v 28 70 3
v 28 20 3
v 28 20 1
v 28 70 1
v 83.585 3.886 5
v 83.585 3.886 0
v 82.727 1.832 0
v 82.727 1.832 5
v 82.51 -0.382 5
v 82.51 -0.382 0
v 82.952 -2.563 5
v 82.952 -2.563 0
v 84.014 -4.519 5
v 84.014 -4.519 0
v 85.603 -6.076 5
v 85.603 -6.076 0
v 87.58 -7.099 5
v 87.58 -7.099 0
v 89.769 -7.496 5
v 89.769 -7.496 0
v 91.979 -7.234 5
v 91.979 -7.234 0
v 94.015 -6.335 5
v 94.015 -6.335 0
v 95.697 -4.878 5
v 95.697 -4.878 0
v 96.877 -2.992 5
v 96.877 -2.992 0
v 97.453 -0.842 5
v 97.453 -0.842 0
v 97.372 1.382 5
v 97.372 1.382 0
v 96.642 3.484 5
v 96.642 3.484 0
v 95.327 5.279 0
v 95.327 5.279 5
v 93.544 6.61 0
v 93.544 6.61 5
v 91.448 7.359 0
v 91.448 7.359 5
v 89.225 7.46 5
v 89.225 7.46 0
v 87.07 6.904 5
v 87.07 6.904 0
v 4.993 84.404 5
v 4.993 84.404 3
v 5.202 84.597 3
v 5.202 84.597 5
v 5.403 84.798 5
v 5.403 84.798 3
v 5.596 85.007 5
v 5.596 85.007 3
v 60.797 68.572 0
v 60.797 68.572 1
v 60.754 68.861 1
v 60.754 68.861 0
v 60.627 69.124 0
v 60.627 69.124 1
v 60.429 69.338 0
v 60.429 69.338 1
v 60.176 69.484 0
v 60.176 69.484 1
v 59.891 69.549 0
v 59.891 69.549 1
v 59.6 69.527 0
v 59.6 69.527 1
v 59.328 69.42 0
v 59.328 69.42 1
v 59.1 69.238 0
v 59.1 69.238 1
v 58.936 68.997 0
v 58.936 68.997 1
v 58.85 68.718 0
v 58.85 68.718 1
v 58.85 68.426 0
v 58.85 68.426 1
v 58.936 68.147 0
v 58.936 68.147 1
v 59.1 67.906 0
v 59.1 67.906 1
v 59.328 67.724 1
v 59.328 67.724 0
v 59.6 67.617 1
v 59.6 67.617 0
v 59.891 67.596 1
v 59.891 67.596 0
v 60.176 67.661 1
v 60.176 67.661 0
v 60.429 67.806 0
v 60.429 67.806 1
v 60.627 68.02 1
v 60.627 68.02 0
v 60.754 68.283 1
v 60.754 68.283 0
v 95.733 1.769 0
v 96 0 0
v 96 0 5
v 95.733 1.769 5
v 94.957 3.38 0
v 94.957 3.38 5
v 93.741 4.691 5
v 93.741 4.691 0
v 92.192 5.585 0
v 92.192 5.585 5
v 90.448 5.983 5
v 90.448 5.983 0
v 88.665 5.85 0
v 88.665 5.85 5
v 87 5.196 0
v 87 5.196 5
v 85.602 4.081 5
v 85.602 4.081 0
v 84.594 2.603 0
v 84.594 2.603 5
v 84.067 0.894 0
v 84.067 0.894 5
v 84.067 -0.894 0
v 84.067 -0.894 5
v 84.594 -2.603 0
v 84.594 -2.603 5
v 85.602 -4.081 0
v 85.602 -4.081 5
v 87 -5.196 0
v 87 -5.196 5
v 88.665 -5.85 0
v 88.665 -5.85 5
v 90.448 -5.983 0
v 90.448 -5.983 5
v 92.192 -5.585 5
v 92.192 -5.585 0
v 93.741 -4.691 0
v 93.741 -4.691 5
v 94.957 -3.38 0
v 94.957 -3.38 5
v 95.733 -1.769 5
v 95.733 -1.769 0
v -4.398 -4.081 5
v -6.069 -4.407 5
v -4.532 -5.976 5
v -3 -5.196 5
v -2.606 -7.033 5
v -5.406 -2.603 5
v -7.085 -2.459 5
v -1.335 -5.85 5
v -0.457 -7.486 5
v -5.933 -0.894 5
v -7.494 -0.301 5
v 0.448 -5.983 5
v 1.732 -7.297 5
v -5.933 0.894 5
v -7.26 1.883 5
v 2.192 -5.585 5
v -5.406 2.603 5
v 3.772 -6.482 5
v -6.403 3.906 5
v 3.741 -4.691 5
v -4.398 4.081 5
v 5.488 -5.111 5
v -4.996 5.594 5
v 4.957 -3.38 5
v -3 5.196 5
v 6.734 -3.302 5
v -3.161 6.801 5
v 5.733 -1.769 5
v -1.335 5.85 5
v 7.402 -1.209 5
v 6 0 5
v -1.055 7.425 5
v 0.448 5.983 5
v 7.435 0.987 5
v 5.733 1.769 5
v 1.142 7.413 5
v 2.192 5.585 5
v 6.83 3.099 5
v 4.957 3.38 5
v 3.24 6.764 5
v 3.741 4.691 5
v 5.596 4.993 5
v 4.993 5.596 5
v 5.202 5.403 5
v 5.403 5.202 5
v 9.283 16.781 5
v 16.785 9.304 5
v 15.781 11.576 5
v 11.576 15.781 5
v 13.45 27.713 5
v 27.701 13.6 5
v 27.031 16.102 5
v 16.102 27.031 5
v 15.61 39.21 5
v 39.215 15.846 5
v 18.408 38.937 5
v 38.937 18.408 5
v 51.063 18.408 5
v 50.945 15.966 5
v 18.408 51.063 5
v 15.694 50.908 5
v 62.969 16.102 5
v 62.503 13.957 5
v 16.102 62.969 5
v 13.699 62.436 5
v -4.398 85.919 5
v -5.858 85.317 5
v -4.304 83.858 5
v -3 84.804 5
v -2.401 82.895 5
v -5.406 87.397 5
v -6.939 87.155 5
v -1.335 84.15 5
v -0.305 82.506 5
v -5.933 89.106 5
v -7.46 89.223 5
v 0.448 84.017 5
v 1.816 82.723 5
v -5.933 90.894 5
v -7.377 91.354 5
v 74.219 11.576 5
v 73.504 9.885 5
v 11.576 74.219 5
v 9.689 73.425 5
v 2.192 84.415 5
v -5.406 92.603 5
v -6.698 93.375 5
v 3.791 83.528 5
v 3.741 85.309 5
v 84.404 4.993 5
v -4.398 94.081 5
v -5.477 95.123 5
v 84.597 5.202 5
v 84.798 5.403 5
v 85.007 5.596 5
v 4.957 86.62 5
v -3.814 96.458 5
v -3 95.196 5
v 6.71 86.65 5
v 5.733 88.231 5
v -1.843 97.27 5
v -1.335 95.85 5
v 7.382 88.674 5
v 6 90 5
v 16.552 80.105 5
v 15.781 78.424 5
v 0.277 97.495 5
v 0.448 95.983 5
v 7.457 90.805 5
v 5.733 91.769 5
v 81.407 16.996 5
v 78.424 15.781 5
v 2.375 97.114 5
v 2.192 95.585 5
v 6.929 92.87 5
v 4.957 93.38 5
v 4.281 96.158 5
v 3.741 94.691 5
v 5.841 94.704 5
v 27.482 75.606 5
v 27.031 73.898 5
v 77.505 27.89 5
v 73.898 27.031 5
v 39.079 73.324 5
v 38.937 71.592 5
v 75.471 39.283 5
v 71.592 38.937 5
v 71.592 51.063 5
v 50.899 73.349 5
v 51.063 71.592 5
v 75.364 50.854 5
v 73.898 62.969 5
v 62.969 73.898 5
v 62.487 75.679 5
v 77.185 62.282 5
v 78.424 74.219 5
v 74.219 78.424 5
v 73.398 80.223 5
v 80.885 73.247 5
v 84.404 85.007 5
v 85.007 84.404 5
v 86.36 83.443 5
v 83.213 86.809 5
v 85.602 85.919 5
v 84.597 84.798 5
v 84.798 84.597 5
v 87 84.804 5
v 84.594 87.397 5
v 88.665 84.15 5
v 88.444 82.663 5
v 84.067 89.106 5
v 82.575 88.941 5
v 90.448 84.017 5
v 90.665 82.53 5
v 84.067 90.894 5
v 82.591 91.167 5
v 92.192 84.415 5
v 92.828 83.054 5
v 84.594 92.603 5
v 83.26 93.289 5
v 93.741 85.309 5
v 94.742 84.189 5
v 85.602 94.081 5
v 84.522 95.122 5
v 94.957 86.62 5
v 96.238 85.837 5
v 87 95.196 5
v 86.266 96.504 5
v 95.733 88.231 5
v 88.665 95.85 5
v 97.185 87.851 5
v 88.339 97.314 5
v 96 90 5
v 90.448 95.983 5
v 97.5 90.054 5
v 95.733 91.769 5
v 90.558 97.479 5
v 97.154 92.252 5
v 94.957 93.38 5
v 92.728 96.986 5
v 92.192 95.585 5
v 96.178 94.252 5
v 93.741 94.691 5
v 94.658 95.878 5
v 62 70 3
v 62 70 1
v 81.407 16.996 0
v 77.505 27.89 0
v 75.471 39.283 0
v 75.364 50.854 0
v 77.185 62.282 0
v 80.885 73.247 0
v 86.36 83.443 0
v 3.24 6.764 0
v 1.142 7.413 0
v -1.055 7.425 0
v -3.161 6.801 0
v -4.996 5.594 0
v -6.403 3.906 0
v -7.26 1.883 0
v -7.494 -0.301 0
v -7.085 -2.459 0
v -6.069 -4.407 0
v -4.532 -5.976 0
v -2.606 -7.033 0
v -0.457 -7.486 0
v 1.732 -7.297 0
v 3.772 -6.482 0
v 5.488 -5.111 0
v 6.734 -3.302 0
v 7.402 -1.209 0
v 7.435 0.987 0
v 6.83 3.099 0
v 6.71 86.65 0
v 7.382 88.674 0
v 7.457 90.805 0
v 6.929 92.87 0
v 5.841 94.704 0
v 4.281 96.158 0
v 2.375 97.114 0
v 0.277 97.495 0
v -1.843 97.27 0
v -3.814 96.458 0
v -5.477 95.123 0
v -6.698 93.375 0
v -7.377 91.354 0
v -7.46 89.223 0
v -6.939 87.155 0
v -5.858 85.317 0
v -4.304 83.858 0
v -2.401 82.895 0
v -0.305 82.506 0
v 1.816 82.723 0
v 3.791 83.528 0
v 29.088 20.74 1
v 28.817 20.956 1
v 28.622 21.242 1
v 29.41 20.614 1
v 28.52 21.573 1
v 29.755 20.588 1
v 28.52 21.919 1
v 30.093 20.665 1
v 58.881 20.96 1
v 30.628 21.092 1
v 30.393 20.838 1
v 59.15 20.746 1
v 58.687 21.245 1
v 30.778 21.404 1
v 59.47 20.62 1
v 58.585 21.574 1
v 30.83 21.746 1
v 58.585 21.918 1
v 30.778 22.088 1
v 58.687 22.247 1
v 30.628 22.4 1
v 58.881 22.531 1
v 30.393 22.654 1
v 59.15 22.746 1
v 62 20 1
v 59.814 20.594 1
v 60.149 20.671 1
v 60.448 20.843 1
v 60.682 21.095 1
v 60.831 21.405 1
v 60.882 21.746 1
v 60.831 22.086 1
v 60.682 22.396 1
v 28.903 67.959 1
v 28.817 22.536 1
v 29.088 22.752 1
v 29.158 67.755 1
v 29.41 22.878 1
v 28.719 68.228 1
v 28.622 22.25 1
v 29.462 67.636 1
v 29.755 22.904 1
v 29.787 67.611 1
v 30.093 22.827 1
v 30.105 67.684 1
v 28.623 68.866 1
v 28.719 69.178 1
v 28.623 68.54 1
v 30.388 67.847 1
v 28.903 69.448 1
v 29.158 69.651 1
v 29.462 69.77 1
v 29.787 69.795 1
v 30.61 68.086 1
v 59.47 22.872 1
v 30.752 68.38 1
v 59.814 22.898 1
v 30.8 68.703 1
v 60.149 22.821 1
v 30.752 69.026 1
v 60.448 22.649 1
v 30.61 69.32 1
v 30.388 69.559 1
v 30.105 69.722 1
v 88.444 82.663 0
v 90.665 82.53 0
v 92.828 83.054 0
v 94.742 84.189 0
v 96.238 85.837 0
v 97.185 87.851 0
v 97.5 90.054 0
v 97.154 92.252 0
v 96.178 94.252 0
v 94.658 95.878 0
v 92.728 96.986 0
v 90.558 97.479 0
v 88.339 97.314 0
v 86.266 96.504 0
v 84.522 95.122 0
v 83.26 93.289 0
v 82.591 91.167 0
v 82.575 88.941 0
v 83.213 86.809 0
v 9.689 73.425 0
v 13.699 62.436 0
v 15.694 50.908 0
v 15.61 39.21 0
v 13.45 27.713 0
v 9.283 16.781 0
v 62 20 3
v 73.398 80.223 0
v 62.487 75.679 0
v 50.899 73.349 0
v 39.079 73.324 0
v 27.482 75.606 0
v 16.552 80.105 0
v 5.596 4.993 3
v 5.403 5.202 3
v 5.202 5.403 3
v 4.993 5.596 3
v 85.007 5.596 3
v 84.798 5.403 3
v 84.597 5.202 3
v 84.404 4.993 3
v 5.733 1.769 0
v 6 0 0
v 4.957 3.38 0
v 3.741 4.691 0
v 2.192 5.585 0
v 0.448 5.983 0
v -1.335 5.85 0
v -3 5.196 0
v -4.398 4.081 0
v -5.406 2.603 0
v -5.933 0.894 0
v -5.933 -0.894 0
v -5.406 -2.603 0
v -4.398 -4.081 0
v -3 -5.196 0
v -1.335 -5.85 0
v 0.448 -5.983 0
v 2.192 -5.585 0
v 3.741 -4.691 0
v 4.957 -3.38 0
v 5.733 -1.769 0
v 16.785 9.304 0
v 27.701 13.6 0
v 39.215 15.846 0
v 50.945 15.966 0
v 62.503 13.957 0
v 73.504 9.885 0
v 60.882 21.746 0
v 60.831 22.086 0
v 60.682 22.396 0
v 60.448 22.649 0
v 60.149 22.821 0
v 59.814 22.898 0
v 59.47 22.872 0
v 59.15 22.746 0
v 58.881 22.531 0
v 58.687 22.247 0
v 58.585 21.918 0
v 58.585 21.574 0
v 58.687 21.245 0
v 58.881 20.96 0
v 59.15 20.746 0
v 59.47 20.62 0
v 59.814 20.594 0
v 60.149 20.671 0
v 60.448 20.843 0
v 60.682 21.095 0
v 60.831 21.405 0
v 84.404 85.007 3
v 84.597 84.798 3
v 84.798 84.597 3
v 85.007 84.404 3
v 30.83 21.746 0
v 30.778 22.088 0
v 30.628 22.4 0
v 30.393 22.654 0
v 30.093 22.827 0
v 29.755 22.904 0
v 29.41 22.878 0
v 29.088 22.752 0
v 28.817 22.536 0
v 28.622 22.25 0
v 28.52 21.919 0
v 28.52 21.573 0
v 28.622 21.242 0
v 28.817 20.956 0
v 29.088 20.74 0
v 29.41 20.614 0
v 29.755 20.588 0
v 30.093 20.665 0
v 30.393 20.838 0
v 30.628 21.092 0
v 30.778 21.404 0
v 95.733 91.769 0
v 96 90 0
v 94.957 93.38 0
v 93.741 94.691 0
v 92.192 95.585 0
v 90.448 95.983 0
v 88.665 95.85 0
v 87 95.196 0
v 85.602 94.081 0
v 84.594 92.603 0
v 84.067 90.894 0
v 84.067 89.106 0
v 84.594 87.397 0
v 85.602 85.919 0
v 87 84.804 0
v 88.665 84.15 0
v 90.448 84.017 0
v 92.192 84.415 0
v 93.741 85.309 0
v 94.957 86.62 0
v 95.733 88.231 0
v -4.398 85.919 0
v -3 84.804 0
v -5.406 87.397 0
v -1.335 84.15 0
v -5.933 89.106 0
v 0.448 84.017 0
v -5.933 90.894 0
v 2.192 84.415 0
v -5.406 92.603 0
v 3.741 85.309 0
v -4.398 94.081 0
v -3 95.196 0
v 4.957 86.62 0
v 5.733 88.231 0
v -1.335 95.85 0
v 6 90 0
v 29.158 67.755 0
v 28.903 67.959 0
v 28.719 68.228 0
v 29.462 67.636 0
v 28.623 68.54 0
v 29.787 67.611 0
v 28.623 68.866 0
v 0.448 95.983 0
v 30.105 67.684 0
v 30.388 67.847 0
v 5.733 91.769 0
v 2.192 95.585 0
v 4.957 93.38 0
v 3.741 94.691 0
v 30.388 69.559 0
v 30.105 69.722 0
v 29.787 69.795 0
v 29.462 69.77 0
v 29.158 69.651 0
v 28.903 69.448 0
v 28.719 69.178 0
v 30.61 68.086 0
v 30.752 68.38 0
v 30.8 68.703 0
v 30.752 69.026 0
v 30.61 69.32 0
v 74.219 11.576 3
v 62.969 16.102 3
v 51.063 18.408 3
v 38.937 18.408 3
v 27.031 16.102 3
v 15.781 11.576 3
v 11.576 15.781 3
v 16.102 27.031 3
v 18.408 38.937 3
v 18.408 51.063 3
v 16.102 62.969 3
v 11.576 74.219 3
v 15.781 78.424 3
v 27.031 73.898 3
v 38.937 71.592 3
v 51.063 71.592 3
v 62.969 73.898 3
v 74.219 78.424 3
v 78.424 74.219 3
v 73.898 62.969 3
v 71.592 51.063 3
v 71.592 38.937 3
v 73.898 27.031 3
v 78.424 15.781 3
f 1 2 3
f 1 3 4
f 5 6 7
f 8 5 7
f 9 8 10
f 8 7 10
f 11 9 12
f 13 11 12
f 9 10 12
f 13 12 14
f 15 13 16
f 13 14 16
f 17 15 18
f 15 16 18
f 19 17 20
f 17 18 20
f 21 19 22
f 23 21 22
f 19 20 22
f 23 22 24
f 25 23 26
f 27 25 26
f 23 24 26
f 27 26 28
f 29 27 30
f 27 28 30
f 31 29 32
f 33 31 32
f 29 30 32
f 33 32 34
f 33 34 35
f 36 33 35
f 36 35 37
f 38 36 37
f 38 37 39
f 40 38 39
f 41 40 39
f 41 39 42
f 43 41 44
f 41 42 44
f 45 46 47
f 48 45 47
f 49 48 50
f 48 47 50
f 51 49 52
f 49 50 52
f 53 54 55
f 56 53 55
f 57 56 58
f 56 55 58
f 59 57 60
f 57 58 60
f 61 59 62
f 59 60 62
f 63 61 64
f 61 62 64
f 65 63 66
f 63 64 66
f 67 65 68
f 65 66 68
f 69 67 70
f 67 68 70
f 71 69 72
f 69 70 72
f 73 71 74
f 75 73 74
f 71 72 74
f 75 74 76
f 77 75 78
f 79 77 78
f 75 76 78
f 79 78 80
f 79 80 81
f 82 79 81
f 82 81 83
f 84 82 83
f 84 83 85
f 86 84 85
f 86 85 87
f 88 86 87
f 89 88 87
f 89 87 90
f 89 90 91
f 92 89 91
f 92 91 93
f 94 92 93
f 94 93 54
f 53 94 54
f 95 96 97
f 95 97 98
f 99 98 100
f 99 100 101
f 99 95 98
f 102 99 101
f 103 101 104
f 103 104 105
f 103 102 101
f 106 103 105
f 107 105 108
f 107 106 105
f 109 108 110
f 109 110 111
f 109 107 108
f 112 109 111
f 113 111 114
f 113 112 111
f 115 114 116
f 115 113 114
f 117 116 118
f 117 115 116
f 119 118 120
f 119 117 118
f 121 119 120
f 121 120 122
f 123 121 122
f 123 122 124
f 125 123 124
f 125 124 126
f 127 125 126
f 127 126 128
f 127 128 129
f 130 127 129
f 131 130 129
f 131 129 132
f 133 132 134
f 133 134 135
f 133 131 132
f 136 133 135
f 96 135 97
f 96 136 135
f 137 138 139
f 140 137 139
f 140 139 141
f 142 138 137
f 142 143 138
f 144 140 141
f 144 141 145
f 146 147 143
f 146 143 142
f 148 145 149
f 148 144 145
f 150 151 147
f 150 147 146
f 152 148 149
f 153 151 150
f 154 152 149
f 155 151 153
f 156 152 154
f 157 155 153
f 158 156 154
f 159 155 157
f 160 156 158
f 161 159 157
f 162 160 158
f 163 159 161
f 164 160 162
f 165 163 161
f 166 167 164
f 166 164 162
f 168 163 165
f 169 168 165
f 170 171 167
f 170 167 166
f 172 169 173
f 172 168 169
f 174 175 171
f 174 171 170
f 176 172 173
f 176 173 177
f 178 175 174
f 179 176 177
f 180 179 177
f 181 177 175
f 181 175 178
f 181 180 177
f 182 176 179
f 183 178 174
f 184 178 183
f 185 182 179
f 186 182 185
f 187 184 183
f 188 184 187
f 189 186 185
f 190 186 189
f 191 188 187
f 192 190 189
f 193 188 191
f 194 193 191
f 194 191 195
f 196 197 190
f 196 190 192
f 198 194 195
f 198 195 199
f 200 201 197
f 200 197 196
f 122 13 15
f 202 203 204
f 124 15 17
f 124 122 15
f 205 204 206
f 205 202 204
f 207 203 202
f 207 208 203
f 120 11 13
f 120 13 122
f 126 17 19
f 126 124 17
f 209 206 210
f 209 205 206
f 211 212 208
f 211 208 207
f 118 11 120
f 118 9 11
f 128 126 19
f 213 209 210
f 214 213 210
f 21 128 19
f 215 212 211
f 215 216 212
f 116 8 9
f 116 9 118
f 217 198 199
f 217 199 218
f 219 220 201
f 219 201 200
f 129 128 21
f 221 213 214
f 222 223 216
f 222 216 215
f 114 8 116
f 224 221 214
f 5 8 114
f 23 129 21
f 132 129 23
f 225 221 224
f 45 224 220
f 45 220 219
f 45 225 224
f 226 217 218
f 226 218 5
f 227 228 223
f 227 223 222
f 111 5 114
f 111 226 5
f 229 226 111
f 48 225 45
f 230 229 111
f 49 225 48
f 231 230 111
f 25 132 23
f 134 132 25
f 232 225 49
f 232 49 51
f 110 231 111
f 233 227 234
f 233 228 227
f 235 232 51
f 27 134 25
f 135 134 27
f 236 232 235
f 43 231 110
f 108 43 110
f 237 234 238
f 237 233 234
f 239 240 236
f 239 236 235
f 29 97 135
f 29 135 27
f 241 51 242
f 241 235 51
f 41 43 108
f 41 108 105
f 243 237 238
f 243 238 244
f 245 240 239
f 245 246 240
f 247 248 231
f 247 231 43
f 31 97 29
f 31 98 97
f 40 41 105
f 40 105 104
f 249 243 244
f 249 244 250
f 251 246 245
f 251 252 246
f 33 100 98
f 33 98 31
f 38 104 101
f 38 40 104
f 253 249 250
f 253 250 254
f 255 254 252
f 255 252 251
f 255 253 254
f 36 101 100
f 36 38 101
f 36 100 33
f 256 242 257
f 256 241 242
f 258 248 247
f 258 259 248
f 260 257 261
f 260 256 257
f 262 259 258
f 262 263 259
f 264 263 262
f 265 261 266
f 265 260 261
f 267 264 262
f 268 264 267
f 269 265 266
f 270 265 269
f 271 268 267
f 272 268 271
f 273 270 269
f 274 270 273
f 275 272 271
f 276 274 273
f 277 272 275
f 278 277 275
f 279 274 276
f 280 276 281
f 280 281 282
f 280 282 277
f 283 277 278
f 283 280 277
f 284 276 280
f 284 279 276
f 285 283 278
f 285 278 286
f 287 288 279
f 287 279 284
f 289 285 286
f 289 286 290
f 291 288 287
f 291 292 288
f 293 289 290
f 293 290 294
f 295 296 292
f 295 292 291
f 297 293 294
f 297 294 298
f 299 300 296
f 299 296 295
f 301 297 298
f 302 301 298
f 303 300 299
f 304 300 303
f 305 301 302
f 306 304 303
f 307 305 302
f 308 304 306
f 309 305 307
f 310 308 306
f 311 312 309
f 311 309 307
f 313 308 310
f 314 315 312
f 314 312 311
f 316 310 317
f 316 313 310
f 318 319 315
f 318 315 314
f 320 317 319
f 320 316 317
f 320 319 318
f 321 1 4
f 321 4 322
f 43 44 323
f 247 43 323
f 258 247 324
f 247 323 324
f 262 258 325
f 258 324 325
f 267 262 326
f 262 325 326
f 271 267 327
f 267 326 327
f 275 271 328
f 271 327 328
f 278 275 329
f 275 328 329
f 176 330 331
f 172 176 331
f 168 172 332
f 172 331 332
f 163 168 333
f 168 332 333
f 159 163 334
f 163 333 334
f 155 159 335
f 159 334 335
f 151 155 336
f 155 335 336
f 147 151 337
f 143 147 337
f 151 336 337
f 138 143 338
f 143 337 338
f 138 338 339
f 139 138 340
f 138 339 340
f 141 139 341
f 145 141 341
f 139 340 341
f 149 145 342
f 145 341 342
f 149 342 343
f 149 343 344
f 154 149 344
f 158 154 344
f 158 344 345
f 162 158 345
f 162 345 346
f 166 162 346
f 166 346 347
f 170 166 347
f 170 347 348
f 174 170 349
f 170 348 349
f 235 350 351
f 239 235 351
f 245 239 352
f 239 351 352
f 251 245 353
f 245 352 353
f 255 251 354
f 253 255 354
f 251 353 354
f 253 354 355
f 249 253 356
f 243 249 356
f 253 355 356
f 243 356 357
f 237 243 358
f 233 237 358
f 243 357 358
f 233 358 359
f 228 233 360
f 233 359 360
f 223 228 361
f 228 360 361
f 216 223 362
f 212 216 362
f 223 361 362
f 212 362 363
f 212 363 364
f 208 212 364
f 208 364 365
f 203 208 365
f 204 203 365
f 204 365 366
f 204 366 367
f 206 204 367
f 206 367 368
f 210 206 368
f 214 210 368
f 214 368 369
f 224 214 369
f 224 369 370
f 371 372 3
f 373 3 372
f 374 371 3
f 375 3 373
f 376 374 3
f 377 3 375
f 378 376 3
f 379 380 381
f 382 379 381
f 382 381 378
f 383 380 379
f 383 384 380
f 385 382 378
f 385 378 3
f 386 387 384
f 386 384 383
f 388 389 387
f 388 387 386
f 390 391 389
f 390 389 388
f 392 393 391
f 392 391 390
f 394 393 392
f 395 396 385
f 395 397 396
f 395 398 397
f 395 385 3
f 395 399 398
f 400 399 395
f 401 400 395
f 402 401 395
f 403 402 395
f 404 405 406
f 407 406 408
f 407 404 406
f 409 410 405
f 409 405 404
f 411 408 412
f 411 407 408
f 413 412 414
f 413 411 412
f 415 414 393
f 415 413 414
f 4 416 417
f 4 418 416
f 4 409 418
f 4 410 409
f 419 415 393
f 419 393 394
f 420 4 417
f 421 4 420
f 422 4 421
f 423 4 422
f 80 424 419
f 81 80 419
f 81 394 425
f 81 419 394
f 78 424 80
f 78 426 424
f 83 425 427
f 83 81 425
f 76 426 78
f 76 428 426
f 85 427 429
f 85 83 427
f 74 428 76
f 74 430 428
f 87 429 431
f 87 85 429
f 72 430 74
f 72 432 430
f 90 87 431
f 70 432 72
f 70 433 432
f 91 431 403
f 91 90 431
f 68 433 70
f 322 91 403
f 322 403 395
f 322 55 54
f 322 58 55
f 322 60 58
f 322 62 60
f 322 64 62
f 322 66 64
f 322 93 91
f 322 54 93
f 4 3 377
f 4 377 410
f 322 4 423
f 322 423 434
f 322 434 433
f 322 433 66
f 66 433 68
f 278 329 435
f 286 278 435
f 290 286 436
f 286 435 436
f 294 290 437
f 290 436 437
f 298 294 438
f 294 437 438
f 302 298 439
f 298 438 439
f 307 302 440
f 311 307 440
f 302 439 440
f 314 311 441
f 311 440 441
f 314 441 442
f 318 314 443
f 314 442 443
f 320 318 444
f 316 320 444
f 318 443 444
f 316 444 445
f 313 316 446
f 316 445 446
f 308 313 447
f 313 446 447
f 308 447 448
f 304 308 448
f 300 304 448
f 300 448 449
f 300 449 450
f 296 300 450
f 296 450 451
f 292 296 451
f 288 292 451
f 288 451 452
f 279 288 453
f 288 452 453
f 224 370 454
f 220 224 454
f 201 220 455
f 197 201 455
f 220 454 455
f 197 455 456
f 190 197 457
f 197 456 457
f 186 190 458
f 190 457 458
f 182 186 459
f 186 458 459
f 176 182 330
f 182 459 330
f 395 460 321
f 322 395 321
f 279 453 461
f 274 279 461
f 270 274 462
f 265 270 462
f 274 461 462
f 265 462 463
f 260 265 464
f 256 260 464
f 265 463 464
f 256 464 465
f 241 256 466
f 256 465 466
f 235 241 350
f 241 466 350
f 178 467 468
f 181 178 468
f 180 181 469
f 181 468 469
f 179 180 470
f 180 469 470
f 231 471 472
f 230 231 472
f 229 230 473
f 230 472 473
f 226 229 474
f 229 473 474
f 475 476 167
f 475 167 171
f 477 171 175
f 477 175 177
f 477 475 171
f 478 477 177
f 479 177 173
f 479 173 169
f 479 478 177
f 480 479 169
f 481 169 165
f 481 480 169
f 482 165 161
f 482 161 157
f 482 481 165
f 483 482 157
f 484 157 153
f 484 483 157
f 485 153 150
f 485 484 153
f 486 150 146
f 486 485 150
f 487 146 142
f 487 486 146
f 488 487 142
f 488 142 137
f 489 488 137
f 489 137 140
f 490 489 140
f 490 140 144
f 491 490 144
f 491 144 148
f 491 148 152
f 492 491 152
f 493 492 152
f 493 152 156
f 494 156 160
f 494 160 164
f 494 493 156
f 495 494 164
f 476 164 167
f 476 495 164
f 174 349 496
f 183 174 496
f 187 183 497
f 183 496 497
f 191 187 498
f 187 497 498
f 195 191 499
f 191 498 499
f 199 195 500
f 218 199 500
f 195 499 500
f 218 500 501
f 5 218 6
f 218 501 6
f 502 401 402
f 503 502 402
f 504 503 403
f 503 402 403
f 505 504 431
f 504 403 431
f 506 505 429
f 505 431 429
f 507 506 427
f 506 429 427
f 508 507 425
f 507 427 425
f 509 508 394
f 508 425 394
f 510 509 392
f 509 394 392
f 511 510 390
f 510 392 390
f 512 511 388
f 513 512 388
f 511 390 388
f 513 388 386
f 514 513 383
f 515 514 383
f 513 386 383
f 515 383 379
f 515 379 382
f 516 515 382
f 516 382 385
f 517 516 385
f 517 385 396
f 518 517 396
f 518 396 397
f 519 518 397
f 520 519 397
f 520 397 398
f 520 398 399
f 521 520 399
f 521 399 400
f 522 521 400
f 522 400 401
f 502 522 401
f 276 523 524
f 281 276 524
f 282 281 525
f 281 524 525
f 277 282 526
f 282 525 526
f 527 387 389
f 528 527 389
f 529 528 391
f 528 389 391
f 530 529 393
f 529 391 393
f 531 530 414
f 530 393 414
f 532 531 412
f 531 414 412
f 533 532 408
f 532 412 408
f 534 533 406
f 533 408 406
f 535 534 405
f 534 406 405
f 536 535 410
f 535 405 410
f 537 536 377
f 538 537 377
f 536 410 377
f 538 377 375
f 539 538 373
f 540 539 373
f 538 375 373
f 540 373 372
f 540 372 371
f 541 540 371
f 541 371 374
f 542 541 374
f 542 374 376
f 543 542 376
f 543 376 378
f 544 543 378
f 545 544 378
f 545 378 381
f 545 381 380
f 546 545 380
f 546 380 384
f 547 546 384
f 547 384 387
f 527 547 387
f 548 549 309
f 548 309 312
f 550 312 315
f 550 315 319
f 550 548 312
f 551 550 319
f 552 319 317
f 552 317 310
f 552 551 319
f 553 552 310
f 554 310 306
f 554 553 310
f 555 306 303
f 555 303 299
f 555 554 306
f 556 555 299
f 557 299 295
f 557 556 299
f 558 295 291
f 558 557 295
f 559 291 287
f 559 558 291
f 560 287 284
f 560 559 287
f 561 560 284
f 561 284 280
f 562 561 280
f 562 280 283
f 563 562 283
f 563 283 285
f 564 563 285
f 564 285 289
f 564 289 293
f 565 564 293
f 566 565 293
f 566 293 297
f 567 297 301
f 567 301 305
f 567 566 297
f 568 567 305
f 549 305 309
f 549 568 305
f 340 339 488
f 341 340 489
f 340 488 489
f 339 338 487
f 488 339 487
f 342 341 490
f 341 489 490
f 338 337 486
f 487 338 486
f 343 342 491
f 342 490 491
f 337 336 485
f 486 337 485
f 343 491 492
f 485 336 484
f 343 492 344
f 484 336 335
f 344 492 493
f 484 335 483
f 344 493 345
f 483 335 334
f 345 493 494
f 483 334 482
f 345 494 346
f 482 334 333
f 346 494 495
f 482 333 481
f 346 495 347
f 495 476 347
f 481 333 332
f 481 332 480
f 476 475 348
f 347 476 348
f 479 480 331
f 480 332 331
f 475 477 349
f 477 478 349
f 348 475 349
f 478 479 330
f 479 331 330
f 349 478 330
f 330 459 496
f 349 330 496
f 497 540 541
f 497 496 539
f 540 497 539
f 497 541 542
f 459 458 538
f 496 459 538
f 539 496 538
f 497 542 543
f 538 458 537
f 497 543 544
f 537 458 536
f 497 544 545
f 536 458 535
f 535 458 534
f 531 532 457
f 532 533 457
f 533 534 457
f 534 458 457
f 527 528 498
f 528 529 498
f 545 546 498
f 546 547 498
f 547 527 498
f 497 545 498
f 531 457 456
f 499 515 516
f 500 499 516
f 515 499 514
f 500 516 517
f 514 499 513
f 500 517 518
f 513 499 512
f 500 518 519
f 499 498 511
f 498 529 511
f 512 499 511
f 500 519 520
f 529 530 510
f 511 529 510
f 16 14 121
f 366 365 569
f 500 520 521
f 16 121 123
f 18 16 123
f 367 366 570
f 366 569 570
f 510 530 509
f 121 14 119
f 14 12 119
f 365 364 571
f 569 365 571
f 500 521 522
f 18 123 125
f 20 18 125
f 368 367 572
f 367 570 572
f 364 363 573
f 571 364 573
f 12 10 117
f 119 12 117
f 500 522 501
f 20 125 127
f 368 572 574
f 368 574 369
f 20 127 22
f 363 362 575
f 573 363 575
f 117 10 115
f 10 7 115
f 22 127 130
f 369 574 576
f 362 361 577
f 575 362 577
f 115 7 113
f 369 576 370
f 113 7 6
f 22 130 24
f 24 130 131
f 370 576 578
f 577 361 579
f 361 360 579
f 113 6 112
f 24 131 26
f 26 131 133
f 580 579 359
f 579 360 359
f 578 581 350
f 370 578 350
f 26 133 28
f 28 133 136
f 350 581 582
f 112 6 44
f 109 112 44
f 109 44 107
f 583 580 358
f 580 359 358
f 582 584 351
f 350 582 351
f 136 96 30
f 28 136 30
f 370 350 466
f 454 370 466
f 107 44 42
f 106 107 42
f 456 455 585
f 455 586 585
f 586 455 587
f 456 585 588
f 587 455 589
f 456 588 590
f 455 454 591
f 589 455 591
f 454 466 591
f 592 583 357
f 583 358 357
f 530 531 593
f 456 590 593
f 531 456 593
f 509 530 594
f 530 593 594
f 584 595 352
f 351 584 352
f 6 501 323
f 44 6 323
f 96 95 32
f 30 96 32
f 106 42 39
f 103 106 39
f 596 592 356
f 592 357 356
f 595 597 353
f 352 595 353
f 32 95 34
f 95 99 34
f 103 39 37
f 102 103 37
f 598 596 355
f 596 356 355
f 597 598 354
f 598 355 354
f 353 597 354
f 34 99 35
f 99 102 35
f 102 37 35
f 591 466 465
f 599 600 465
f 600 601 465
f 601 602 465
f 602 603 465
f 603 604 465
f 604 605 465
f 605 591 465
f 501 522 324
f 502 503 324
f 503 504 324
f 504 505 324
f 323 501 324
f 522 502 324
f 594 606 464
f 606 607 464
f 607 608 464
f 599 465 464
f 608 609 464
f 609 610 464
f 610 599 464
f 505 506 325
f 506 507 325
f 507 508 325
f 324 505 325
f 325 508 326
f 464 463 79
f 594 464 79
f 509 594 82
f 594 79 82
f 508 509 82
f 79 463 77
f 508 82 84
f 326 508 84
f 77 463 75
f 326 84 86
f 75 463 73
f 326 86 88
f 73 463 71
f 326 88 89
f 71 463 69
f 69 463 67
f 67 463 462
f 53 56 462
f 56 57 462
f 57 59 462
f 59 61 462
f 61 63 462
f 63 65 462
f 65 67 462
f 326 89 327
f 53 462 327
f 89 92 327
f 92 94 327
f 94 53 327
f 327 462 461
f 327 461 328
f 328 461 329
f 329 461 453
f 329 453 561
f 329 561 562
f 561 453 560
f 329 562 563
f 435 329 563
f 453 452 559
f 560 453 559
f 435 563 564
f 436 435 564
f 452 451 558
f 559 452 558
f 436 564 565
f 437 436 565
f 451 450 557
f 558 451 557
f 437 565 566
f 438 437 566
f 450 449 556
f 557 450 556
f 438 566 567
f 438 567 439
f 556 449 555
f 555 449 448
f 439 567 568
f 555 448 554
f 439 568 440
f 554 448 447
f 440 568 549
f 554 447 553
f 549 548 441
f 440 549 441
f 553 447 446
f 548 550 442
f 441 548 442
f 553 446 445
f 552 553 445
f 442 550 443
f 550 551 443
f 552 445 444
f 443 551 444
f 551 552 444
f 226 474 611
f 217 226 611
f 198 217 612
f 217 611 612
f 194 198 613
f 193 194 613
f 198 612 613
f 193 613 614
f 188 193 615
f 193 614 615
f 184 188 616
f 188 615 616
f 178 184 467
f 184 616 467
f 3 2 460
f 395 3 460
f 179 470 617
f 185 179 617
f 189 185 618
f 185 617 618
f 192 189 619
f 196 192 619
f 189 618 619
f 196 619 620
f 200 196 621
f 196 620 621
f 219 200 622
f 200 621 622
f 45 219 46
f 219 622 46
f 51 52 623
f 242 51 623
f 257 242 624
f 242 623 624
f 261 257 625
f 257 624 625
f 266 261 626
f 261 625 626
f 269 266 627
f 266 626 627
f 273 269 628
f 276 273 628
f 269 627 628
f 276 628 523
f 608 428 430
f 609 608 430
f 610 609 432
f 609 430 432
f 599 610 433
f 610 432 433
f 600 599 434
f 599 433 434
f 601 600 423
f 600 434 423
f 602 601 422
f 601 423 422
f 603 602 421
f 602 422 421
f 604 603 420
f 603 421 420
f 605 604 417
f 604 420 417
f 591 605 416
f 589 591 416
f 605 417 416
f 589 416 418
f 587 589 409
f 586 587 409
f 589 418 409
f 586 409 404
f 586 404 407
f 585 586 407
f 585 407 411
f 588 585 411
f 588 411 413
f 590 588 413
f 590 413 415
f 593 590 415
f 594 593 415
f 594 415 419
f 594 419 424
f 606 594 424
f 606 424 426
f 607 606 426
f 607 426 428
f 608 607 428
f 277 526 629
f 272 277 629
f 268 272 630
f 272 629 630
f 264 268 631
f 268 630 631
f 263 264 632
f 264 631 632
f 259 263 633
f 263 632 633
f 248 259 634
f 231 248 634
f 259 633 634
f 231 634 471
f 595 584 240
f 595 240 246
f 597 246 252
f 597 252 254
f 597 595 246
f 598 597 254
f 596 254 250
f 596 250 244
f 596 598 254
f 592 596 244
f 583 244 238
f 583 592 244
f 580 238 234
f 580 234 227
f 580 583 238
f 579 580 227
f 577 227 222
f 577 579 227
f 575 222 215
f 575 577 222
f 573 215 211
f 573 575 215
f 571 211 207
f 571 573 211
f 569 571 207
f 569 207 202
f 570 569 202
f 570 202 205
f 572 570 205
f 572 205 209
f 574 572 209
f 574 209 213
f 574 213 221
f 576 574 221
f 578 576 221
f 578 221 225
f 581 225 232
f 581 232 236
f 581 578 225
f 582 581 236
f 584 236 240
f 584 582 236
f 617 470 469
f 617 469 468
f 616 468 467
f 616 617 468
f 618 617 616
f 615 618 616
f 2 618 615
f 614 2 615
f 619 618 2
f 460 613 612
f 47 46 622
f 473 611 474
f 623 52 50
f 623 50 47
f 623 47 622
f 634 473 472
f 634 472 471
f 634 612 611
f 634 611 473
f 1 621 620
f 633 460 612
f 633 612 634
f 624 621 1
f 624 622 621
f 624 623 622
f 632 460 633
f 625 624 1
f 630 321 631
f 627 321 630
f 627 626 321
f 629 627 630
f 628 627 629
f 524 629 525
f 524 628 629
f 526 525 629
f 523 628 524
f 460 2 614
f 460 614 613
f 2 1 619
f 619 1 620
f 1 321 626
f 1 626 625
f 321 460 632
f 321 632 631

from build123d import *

# Parameters (mm, degrees)
F0_R     = 6
F1_DEPTH = 5
F2_DEPTH = 3
F3_W     = 34
F3_H     = 50
F4_DEPTH = 2
F5_R     = 1.155008
F5_R_2   = 1.094696
F5_R_3   = 1.161259
F5_R_4   = 0.979267
F6_DEPTH = 3.001


with BuildPart() as f1:
    # F0 (on Top) → F1 (new body)
    with BuildSketch(Plane.XY):
        with BuildLine():
            ThreePointArc((83.212636, 86.809125), (44.989895, 73.04652), (6.710183, 86.64986))
            ThreePointArc((6.710183, 86.64986), (-5.47746, 95.123225), (3.790625, 83.528434))
            ThreePointArc((3.790625, 83.528434), (15.91287, 45.057288), (3.24039, 6.763865))
            ThreePointArc((3.24039, 6.763865), (-5.358143, -5.247885), (6.829769, 3.099073))
            ThreePointArc((6.829769, 3.099073), (45.077454, 16.173317), (83.585051, 3.88567))
            ThreePointArc((83.585051, 3.88567), (94.910037, -5.66935), (87.070277, 6.904109))
            ThreePointArc((87.070277, 6.904109), (75.1752, 45.066281), (86.359609, 83.442748))
            ThreePointArc((86.359609, 83.442748), (95.478836, 95.121753), (83.212636, 86.809125))
        make_face()
        Circle(F0_R, mode=Mode.SUBTRACT)
        with Locations((90, 0)):
            Circle(F0_R, mode=Mode.SUBTRACT)
        with BuildLine():
            ThreePointArc((85.006812, 84.403744), (71.302344, 45), (85.006812, 5.596256))
            ThreePointArc((85.006812, 5.596256), (84.696699, 5.303301), (84.403744, 4.993188))
            ThreePointArc((84.403744, 4.993188), (45, 18.697656), (5.596256, 4.993188))
            ThreePointArc((5.596256, 4.993188), (5.303301, 5.303301), (4.993188, 5.596256))
            ThreePointArc((4.993188, 5.596256), (18.697656, 45), (4.993188, 84.403744))
            ThreePointArc((4.993188, 84.403744), (5.303301, 84.696699), (5.596256, 85.006812))
            ThreePointArc((5.596256, 85.006812), (45, 71.302344), (84.403744, 85.006812))
            ThreePointArc((84.403744, 85.006812), (84.696699, 84.696699), (85.006812, 84.403744))
        make_face(mode=Mode.SUBTRACT)
        with Locations((0, 90)):
            Circle(F0_R, mode=Mode.SUBTRACT)
        with Locations((90, 90)):
            Circle(F0_R, mode=Mode.SUBTRACT)
    extrude(amount=F1_DEPTH)

    # F0 (on Top) → F2 (join)
    with BuildSketch(Plane.XY):
        with BuildLine():
            ThreePointArc((84.403744, 4.993188), (84.696699, 5.303301), (85.006812, 5.596256))
            ThreePointArc((85.006812, 5.596256), (71.302344, 45), (85.006812, 84.403744))
            ThreePointArc((85.006812, 84.403744), (84.696699, 84.696699), (84.403744, 85.006812))
            ThreePointArc((84.403744, 85.006812), (45, 71.302344), (5.596256, 85.006812))
            ThreePointArc((5.596256, 85.006812), (5.303301, 84.696699), (4.993188, 84.403744))
            ThreePointArc((4.993188, 84.403744), (18.697656, 45), (4.993188, 5.596256))
            ThreePointArc((4.993188, 5.596256), (5.303301, 5.303301), (5.596256, 4.993188))
            ThreePointArc((5.596256, 4.993188), (45, 18.697656), (84.403744, 4.993188))
        make_face()
    extrude(amount=F2_DEPTH)

    # F3 (on face) → F4 (cut)
    with BuildSketch(Plane.XY.offset(3)):
        with Locations((45, 45)):
            Rectangle(F3_W, F3_H)
    extrude(amount=-F4_DEPTH, mode=Mode.SUBTRACT)

    # F5 (on face) → F6 (cut, through all)
    with BuildSketch(Plane.XY.offset(3)):
        with Locations((59.727397, 21.745855)):
            Circle(F5_R)
        with Locations((29.705523, 68.703085)):
            Circle(F5_R_2)
        with Locations((29.668592, 21.745855)):
            Circle(F5_R_3)
        with Locations((59.817981, 68.572104)):
            Circle(F5_R_4)
    extrude(amount=-F6_DEPTH, mode=Mode.SUBTRACT)


solid = f1.part
